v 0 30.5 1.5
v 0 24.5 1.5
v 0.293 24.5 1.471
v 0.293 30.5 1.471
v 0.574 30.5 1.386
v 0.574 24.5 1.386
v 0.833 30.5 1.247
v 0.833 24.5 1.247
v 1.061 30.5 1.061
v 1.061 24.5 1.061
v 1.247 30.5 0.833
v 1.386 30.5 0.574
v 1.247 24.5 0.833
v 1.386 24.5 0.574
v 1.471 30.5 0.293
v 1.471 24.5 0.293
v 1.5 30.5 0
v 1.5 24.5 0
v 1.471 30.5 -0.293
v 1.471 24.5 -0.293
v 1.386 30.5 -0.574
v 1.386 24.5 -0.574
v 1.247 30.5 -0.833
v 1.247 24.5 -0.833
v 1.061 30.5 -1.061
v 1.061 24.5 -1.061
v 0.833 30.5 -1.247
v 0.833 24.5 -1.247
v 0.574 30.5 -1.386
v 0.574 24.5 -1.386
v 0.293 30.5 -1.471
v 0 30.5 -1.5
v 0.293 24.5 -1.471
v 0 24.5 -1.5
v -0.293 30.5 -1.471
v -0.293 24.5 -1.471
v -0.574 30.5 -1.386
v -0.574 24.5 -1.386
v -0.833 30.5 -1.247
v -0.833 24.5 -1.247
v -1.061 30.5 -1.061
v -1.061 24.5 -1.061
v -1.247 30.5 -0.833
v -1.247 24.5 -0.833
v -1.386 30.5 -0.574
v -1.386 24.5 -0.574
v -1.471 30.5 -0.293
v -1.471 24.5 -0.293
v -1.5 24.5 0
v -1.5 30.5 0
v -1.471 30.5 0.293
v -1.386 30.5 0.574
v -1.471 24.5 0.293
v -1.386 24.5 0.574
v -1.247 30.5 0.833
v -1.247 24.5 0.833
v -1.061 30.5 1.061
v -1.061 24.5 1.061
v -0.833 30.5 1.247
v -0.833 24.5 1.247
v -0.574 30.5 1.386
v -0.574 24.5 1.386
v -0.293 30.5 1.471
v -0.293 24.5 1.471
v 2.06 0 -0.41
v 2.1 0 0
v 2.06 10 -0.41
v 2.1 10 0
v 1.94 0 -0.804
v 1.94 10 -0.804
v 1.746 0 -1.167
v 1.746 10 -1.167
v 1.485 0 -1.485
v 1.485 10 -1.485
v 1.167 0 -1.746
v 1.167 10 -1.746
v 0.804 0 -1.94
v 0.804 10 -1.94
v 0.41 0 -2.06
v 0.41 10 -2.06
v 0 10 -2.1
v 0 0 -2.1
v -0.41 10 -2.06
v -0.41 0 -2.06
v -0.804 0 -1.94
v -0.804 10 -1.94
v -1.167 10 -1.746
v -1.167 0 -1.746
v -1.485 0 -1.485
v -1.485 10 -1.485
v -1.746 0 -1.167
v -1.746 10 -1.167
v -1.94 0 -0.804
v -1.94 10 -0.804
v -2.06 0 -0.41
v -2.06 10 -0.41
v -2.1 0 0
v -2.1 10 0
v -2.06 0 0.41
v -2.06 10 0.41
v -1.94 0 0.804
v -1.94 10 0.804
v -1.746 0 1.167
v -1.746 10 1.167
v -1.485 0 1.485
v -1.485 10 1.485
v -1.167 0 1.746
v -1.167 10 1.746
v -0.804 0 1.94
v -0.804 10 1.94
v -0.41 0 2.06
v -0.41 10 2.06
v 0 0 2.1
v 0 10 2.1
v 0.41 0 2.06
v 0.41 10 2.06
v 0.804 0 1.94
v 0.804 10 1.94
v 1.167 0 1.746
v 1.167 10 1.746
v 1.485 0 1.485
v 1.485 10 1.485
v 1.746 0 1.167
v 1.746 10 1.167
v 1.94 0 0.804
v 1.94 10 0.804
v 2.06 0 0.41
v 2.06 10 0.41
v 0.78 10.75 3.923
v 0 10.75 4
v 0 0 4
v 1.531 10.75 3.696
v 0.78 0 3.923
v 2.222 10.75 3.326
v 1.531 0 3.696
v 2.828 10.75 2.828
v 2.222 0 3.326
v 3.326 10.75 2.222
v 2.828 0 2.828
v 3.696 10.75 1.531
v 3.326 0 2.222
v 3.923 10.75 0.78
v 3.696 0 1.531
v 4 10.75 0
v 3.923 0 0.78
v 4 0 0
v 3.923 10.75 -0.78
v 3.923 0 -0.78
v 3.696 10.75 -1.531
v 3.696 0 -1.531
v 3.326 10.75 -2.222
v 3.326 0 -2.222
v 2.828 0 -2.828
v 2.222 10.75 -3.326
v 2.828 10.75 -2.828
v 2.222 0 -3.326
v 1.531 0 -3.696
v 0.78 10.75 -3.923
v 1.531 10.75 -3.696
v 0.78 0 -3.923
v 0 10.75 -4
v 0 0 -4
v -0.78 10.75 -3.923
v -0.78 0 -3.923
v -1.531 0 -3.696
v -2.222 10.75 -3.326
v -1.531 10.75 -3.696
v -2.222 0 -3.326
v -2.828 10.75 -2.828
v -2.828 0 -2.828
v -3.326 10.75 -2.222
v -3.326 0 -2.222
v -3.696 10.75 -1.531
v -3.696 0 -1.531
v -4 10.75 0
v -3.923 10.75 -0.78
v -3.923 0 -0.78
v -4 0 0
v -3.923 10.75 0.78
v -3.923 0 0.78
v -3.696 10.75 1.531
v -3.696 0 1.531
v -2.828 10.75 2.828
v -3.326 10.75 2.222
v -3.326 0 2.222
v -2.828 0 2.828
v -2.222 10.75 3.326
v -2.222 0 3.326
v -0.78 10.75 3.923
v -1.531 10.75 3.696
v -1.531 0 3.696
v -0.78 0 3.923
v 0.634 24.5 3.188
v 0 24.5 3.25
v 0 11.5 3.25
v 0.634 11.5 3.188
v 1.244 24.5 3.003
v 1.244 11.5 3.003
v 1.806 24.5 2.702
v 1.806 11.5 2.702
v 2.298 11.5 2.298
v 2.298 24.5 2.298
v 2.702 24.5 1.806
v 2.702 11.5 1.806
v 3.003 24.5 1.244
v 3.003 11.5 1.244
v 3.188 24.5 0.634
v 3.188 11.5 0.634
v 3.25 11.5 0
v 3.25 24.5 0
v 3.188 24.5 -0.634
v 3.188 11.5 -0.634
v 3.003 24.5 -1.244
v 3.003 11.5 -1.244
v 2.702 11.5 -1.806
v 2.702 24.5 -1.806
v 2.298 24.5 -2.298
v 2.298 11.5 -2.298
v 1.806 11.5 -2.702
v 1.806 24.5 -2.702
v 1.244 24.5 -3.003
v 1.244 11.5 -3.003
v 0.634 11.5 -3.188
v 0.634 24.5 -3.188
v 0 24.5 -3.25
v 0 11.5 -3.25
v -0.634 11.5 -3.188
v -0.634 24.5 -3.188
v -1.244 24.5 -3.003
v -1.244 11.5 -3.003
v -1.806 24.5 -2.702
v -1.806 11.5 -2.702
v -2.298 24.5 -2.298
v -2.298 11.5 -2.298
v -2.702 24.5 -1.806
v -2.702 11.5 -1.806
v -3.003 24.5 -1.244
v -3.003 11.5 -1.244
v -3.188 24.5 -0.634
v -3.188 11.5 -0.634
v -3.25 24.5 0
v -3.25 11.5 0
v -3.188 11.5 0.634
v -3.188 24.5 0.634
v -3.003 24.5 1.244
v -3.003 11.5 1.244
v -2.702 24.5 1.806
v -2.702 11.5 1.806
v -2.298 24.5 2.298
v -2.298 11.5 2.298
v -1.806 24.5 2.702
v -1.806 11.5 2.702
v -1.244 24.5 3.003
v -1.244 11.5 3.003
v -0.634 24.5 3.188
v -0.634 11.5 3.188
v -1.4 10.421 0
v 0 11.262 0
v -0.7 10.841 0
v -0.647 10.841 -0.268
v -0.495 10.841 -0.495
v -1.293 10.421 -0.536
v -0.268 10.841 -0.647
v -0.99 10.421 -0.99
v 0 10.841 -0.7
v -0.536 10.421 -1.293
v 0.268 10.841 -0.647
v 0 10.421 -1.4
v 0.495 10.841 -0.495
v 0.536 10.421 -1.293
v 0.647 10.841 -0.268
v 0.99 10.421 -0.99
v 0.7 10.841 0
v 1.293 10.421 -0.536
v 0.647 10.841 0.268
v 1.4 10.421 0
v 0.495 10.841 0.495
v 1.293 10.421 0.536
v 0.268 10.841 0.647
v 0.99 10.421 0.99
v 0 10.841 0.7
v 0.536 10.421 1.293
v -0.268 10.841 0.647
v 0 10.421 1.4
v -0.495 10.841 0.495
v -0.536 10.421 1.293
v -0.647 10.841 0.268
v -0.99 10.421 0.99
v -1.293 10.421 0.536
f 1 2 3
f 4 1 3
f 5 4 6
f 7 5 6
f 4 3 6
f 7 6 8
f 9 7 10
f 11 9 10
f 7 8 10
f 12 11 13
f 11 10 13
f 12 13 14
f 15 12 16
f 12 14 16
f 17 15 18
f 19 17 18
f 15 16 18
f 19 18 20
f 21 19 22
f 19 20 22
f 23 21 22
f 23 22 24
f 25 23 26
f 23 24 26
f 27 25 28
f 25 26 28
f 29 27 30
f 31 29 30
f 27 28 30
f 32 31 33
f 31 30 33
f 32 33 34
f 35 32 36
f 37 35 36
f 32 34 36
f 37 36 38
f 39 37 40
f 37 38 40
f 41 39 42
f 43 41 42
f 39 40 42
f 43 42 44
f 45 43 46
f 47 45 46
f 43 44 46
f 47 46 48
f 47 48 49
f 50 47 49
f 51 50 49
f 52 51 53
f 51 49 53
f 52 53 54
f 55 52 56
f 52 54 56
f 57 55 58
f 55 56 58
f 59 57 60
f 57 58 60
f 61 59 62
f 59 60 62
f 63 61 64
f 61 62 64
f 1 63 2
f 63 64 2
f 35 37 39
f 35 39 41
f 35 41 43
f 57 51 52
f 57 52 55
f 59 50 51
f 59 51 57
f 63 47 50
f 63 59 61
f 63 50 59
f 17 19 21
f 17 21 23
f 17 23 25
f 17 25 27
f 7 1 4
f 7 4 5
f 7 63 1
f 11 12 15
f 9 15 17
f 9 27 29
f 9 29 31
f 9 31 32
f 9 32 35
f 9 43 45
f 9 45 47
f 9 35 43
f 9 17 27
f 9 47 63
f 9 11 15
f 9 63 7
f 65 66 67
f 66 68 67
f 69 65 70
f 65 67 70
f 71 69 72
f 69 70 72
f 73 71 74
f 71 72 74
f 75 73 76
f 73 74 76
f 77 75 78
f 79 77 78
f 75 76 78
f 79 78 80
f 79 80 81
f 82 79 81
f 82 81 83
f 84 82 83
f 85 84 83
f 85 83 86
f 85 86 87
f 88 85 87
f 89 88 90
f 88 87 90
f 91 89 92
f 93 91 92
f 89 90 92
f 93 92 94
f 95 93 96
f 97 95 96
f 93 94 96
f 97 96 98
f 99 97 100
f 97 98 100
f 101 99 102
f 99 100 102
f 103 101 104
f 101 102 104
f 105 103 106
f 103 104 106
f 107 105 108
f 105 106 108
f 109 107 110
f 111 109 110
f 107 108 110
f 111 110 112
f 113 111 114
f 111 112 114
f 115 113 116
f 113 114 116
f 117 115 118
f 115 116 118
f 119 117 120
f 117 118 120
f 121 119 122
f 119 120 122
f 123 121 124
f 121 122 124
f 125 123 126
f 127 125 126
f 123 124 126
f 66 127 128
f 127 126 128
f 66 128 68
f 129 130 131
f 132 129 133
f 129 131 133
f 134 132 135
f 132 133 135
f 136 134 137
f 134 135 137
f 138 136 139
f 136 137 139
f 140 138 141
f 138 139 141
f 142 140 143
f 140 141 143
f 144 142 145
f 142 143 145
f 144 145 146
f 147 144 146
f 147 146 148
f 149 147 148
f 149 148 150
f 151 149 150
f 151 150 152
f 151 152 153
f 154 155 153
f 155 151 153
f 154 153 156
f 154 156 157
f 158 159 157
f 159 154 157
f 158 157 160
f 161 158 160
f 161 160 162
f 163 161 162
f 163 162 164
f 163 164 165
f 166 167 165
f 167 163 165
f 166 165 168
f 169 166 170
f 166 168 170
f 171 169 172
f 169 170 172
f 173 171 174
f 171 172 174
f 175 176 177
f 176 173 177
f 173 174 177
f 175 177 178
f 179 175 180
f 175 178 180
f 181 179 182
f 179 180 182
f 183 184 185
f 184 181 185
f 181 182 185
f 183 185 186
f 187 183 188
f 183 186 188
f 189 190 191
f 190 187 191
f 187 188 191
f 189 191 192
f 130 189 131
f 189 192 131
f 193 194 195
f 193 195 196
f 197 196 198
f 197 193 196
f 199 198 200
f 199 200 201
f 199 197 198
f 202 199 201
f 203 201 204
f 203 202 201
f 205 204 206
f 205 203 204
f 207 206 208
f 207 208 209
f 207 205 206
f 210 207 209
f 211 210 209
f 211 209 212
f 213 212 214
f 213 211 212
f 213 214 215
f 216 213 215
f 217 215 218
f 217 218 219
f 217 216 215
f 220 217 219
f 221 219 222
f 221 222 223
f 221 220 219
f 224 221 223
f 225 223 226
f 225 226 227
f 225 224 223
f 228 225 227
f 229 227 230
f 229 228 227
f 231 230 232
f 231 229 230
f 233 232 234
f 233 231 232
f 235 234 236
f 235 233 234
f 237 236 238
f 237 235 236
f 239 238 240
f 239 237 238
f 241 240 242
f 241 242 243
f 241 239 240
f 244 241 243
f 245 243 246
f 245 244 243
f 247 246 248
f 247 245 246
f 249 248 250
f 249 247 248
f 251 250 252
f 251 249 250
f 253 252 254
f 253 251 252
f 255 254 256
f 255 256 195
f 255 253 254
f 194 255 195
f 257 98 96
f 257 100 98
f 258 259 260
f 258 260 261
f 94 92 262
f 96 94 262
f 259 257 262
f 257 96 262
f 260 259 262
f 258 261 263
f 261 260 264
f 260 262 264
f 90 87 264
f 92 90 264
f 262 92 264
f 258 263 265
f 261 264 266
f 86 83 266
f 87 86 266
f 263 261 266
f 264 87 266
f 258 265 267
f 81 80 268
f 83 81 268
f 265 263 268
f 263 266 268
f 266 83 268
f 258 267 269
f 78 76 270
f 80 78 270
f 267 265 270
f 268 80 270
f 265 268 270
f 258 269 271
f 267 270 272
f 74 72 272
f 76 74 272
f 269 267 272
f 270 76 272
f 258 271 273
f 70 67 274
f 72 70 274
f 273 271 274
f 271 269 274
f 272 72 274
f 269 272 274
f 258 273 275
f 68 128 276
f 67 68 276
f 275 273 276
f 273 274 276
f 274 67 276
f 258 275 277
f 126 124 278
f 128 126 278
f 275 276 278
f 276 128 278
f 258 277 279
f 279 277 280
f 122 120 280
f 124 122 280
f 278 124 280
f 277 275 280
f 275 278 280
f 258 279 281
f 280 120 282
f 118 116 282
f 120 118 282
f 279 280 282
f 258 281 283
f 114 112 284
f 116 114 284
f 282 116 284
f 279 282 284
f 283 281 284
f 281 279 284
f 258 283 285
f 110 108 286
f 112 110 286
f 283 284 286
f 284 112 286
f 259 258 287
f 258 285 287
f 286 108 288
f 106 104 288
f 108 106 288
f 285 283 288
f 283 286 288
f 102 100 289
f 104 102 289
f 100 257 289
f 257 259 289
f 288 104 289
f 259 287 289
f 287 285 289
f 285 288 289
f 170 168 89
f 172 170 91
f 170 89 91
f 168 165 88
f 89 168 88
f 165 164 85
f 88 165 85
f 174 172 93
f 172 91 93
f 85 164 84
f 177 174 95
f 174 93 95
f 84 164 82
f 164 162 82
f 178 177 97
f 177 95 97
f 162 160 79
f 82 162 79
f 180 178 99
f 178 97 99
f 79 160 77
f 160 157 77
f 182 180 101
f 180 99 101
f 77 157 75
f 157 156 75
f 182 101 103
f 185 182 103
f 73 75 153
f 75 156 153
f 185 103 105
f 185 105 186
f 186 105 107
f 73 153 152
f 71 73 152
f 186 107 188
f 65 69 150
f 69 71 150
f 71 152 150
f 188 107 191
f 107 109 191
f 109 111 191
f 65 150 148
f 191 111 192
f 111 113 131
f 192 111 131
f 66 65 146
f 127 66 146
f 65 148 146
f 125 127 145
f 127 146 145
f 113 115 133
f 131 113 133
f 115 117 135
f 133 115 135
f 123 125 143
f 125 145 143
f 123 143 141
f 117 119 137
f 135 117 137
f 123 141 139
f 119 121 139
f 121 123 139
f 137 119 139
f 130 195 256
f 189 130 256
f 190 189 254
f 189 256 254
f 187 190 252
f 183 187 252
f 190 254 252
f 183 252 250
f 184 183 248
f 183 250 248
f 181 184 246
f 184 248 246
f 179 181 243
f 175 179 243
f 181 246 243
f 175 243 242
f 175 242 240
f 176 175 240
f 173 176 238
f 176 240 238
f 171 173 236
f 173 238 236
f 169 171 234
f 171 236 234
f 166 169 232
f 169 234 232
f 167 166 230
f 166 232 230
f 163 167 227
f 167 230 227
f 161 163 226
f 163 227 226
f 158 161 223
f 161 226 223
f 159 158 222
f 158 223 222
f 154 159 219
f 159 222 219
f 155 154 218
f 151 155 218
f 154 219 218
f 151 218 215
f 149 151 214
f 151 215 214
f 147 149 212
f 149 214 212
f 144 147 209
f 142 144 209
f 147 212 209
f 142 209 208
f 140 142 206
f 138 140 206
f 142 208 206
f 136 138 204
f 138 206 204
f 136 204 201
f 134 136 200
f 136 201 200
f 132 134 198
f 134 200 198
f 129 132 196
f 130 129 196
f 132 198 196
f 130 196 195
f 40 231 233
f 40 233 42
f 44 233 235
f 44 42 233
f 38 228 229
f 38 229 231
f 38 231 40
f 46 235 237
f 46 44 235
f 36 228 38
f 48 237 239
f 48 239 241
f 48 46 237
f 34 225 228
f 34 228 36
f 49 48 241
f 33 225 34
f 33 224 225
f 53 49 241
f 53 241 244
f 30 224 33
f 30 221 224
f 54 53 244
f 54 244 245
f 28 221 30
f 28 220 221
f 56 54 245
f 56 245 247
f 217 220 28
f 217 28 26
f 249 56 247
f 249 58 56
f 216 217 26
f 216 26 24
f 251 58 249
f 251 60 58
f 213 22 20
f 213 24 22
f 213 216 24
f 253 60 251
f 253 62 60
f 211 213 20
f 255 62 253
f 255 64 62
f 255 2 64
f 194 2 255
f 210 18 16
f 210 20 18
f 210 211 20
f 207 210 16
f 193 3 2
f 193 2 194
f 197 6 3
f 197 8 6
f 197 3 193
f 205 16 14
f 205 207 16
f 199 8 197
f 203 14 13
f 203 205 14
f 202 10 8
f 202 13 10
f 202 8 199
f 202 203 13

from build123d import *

# Parameters (mm, degrees)
SKETCH_1_R             = 4
EXTRUDE_1_DEPTH        = 24.5
SKETCH_2_R             = 1.5
EXTRUDE_2_DEPTH        = 6
HOLE_WIZARD_M5_1_D     = 4.2
HOLE_WIZARD_M5_1_DEPTH = 10
HOLE_WIZARD_M5_1_TIP   = 1.2618073
SKETCH_5_OUTSIDE_W     = 16.506
SKETCH_5_OUTSIDE_H     = 16.506
SKETCH_5_OUTSIDE_R     = 3.25
CUT_EXTRUDE_1_DEPTH    = 13
CHAMFER_1_SIZE         = 0.75


with BuildPart() as part:
    # 草图1 → 凸台-拉伸1 (new body)
    with BuildSketch(Plane(origin=(0, 0, 0), x_dir=(1, 0, 0), z_dir=(0, 1, 0))):
        with Locations(Location((0, 0, 0), (0, 0, 270))):
            Circle(SKETCH_1_R)
    extrude(amount=EXTRUDE_1_DEPTH)

    # 草图2 → 凸台-拉伸2 (add)
    with BuildSketch(Plane(origin=(0, 24.5, 0), x_dir=(1, 0, 0), z_dir=(0, 1, 0))):
        with Locations(Location((0, 0, 0), (0, 0, 270))):
            Circle(SKETCH_2_R)
    extrude(amount=EXTRUDE_2_DEPTH)

    # M5 螺纹孔1
    with Locations(Plane(origin=(0, 0, 0), x_dir=(-1, 0, 0), z_dir=(0, -1, 0))):
        with Locations((0, 0)):
            Hole(HOLE_WIZARD_M5_1_D / 2, depth=HOLE_WIZARD_M5_1_DEPTH)
            with Locations((0, 0, -(HOLE_WIZARD_M5_1_DEPTH + HOLE_WIZARD_M5_1_TIP / 2))):  # 118° drill point
                Cone(0, HOLE_WIZARD_M5_1_D / 2, HOLE_WIZARD_M5_1_TIP, mode=Mode.SUBTRACT)

    # 草图5 outside → 切除-拉伸1 (cut)
    with BuildSketch(Plane(origin=(0, 24.5, 0), x_dir=(1, 0, 0), z_dir=(0, 1, 0))):
        Rectangle(SKETCH_5_OUTSIDE_W, SKETCH_5_OUTSIDE_H)
        with Locations(Location((0, 0, 0), (0, 0, 270))):
            Circle(SKETCH_5_OUTSIDE_R, mode=Mode.SUBTRACT)
    extrude(amount=-CUT_EXTRUDE_1_DEPTH, mode=Mode.SUBTRACT)

    # 倒角1
    chamfer_1_edges = [part.edges().sort_by_distance(p)[0] for p in [
        (0, 11.5, -4),
    ]]
    chamfer(chamfer_1_edges, length=CHAMFER_1_SIZE - 0.0001)  # a hair under: the kernel refuses the full size


solid = part.part
